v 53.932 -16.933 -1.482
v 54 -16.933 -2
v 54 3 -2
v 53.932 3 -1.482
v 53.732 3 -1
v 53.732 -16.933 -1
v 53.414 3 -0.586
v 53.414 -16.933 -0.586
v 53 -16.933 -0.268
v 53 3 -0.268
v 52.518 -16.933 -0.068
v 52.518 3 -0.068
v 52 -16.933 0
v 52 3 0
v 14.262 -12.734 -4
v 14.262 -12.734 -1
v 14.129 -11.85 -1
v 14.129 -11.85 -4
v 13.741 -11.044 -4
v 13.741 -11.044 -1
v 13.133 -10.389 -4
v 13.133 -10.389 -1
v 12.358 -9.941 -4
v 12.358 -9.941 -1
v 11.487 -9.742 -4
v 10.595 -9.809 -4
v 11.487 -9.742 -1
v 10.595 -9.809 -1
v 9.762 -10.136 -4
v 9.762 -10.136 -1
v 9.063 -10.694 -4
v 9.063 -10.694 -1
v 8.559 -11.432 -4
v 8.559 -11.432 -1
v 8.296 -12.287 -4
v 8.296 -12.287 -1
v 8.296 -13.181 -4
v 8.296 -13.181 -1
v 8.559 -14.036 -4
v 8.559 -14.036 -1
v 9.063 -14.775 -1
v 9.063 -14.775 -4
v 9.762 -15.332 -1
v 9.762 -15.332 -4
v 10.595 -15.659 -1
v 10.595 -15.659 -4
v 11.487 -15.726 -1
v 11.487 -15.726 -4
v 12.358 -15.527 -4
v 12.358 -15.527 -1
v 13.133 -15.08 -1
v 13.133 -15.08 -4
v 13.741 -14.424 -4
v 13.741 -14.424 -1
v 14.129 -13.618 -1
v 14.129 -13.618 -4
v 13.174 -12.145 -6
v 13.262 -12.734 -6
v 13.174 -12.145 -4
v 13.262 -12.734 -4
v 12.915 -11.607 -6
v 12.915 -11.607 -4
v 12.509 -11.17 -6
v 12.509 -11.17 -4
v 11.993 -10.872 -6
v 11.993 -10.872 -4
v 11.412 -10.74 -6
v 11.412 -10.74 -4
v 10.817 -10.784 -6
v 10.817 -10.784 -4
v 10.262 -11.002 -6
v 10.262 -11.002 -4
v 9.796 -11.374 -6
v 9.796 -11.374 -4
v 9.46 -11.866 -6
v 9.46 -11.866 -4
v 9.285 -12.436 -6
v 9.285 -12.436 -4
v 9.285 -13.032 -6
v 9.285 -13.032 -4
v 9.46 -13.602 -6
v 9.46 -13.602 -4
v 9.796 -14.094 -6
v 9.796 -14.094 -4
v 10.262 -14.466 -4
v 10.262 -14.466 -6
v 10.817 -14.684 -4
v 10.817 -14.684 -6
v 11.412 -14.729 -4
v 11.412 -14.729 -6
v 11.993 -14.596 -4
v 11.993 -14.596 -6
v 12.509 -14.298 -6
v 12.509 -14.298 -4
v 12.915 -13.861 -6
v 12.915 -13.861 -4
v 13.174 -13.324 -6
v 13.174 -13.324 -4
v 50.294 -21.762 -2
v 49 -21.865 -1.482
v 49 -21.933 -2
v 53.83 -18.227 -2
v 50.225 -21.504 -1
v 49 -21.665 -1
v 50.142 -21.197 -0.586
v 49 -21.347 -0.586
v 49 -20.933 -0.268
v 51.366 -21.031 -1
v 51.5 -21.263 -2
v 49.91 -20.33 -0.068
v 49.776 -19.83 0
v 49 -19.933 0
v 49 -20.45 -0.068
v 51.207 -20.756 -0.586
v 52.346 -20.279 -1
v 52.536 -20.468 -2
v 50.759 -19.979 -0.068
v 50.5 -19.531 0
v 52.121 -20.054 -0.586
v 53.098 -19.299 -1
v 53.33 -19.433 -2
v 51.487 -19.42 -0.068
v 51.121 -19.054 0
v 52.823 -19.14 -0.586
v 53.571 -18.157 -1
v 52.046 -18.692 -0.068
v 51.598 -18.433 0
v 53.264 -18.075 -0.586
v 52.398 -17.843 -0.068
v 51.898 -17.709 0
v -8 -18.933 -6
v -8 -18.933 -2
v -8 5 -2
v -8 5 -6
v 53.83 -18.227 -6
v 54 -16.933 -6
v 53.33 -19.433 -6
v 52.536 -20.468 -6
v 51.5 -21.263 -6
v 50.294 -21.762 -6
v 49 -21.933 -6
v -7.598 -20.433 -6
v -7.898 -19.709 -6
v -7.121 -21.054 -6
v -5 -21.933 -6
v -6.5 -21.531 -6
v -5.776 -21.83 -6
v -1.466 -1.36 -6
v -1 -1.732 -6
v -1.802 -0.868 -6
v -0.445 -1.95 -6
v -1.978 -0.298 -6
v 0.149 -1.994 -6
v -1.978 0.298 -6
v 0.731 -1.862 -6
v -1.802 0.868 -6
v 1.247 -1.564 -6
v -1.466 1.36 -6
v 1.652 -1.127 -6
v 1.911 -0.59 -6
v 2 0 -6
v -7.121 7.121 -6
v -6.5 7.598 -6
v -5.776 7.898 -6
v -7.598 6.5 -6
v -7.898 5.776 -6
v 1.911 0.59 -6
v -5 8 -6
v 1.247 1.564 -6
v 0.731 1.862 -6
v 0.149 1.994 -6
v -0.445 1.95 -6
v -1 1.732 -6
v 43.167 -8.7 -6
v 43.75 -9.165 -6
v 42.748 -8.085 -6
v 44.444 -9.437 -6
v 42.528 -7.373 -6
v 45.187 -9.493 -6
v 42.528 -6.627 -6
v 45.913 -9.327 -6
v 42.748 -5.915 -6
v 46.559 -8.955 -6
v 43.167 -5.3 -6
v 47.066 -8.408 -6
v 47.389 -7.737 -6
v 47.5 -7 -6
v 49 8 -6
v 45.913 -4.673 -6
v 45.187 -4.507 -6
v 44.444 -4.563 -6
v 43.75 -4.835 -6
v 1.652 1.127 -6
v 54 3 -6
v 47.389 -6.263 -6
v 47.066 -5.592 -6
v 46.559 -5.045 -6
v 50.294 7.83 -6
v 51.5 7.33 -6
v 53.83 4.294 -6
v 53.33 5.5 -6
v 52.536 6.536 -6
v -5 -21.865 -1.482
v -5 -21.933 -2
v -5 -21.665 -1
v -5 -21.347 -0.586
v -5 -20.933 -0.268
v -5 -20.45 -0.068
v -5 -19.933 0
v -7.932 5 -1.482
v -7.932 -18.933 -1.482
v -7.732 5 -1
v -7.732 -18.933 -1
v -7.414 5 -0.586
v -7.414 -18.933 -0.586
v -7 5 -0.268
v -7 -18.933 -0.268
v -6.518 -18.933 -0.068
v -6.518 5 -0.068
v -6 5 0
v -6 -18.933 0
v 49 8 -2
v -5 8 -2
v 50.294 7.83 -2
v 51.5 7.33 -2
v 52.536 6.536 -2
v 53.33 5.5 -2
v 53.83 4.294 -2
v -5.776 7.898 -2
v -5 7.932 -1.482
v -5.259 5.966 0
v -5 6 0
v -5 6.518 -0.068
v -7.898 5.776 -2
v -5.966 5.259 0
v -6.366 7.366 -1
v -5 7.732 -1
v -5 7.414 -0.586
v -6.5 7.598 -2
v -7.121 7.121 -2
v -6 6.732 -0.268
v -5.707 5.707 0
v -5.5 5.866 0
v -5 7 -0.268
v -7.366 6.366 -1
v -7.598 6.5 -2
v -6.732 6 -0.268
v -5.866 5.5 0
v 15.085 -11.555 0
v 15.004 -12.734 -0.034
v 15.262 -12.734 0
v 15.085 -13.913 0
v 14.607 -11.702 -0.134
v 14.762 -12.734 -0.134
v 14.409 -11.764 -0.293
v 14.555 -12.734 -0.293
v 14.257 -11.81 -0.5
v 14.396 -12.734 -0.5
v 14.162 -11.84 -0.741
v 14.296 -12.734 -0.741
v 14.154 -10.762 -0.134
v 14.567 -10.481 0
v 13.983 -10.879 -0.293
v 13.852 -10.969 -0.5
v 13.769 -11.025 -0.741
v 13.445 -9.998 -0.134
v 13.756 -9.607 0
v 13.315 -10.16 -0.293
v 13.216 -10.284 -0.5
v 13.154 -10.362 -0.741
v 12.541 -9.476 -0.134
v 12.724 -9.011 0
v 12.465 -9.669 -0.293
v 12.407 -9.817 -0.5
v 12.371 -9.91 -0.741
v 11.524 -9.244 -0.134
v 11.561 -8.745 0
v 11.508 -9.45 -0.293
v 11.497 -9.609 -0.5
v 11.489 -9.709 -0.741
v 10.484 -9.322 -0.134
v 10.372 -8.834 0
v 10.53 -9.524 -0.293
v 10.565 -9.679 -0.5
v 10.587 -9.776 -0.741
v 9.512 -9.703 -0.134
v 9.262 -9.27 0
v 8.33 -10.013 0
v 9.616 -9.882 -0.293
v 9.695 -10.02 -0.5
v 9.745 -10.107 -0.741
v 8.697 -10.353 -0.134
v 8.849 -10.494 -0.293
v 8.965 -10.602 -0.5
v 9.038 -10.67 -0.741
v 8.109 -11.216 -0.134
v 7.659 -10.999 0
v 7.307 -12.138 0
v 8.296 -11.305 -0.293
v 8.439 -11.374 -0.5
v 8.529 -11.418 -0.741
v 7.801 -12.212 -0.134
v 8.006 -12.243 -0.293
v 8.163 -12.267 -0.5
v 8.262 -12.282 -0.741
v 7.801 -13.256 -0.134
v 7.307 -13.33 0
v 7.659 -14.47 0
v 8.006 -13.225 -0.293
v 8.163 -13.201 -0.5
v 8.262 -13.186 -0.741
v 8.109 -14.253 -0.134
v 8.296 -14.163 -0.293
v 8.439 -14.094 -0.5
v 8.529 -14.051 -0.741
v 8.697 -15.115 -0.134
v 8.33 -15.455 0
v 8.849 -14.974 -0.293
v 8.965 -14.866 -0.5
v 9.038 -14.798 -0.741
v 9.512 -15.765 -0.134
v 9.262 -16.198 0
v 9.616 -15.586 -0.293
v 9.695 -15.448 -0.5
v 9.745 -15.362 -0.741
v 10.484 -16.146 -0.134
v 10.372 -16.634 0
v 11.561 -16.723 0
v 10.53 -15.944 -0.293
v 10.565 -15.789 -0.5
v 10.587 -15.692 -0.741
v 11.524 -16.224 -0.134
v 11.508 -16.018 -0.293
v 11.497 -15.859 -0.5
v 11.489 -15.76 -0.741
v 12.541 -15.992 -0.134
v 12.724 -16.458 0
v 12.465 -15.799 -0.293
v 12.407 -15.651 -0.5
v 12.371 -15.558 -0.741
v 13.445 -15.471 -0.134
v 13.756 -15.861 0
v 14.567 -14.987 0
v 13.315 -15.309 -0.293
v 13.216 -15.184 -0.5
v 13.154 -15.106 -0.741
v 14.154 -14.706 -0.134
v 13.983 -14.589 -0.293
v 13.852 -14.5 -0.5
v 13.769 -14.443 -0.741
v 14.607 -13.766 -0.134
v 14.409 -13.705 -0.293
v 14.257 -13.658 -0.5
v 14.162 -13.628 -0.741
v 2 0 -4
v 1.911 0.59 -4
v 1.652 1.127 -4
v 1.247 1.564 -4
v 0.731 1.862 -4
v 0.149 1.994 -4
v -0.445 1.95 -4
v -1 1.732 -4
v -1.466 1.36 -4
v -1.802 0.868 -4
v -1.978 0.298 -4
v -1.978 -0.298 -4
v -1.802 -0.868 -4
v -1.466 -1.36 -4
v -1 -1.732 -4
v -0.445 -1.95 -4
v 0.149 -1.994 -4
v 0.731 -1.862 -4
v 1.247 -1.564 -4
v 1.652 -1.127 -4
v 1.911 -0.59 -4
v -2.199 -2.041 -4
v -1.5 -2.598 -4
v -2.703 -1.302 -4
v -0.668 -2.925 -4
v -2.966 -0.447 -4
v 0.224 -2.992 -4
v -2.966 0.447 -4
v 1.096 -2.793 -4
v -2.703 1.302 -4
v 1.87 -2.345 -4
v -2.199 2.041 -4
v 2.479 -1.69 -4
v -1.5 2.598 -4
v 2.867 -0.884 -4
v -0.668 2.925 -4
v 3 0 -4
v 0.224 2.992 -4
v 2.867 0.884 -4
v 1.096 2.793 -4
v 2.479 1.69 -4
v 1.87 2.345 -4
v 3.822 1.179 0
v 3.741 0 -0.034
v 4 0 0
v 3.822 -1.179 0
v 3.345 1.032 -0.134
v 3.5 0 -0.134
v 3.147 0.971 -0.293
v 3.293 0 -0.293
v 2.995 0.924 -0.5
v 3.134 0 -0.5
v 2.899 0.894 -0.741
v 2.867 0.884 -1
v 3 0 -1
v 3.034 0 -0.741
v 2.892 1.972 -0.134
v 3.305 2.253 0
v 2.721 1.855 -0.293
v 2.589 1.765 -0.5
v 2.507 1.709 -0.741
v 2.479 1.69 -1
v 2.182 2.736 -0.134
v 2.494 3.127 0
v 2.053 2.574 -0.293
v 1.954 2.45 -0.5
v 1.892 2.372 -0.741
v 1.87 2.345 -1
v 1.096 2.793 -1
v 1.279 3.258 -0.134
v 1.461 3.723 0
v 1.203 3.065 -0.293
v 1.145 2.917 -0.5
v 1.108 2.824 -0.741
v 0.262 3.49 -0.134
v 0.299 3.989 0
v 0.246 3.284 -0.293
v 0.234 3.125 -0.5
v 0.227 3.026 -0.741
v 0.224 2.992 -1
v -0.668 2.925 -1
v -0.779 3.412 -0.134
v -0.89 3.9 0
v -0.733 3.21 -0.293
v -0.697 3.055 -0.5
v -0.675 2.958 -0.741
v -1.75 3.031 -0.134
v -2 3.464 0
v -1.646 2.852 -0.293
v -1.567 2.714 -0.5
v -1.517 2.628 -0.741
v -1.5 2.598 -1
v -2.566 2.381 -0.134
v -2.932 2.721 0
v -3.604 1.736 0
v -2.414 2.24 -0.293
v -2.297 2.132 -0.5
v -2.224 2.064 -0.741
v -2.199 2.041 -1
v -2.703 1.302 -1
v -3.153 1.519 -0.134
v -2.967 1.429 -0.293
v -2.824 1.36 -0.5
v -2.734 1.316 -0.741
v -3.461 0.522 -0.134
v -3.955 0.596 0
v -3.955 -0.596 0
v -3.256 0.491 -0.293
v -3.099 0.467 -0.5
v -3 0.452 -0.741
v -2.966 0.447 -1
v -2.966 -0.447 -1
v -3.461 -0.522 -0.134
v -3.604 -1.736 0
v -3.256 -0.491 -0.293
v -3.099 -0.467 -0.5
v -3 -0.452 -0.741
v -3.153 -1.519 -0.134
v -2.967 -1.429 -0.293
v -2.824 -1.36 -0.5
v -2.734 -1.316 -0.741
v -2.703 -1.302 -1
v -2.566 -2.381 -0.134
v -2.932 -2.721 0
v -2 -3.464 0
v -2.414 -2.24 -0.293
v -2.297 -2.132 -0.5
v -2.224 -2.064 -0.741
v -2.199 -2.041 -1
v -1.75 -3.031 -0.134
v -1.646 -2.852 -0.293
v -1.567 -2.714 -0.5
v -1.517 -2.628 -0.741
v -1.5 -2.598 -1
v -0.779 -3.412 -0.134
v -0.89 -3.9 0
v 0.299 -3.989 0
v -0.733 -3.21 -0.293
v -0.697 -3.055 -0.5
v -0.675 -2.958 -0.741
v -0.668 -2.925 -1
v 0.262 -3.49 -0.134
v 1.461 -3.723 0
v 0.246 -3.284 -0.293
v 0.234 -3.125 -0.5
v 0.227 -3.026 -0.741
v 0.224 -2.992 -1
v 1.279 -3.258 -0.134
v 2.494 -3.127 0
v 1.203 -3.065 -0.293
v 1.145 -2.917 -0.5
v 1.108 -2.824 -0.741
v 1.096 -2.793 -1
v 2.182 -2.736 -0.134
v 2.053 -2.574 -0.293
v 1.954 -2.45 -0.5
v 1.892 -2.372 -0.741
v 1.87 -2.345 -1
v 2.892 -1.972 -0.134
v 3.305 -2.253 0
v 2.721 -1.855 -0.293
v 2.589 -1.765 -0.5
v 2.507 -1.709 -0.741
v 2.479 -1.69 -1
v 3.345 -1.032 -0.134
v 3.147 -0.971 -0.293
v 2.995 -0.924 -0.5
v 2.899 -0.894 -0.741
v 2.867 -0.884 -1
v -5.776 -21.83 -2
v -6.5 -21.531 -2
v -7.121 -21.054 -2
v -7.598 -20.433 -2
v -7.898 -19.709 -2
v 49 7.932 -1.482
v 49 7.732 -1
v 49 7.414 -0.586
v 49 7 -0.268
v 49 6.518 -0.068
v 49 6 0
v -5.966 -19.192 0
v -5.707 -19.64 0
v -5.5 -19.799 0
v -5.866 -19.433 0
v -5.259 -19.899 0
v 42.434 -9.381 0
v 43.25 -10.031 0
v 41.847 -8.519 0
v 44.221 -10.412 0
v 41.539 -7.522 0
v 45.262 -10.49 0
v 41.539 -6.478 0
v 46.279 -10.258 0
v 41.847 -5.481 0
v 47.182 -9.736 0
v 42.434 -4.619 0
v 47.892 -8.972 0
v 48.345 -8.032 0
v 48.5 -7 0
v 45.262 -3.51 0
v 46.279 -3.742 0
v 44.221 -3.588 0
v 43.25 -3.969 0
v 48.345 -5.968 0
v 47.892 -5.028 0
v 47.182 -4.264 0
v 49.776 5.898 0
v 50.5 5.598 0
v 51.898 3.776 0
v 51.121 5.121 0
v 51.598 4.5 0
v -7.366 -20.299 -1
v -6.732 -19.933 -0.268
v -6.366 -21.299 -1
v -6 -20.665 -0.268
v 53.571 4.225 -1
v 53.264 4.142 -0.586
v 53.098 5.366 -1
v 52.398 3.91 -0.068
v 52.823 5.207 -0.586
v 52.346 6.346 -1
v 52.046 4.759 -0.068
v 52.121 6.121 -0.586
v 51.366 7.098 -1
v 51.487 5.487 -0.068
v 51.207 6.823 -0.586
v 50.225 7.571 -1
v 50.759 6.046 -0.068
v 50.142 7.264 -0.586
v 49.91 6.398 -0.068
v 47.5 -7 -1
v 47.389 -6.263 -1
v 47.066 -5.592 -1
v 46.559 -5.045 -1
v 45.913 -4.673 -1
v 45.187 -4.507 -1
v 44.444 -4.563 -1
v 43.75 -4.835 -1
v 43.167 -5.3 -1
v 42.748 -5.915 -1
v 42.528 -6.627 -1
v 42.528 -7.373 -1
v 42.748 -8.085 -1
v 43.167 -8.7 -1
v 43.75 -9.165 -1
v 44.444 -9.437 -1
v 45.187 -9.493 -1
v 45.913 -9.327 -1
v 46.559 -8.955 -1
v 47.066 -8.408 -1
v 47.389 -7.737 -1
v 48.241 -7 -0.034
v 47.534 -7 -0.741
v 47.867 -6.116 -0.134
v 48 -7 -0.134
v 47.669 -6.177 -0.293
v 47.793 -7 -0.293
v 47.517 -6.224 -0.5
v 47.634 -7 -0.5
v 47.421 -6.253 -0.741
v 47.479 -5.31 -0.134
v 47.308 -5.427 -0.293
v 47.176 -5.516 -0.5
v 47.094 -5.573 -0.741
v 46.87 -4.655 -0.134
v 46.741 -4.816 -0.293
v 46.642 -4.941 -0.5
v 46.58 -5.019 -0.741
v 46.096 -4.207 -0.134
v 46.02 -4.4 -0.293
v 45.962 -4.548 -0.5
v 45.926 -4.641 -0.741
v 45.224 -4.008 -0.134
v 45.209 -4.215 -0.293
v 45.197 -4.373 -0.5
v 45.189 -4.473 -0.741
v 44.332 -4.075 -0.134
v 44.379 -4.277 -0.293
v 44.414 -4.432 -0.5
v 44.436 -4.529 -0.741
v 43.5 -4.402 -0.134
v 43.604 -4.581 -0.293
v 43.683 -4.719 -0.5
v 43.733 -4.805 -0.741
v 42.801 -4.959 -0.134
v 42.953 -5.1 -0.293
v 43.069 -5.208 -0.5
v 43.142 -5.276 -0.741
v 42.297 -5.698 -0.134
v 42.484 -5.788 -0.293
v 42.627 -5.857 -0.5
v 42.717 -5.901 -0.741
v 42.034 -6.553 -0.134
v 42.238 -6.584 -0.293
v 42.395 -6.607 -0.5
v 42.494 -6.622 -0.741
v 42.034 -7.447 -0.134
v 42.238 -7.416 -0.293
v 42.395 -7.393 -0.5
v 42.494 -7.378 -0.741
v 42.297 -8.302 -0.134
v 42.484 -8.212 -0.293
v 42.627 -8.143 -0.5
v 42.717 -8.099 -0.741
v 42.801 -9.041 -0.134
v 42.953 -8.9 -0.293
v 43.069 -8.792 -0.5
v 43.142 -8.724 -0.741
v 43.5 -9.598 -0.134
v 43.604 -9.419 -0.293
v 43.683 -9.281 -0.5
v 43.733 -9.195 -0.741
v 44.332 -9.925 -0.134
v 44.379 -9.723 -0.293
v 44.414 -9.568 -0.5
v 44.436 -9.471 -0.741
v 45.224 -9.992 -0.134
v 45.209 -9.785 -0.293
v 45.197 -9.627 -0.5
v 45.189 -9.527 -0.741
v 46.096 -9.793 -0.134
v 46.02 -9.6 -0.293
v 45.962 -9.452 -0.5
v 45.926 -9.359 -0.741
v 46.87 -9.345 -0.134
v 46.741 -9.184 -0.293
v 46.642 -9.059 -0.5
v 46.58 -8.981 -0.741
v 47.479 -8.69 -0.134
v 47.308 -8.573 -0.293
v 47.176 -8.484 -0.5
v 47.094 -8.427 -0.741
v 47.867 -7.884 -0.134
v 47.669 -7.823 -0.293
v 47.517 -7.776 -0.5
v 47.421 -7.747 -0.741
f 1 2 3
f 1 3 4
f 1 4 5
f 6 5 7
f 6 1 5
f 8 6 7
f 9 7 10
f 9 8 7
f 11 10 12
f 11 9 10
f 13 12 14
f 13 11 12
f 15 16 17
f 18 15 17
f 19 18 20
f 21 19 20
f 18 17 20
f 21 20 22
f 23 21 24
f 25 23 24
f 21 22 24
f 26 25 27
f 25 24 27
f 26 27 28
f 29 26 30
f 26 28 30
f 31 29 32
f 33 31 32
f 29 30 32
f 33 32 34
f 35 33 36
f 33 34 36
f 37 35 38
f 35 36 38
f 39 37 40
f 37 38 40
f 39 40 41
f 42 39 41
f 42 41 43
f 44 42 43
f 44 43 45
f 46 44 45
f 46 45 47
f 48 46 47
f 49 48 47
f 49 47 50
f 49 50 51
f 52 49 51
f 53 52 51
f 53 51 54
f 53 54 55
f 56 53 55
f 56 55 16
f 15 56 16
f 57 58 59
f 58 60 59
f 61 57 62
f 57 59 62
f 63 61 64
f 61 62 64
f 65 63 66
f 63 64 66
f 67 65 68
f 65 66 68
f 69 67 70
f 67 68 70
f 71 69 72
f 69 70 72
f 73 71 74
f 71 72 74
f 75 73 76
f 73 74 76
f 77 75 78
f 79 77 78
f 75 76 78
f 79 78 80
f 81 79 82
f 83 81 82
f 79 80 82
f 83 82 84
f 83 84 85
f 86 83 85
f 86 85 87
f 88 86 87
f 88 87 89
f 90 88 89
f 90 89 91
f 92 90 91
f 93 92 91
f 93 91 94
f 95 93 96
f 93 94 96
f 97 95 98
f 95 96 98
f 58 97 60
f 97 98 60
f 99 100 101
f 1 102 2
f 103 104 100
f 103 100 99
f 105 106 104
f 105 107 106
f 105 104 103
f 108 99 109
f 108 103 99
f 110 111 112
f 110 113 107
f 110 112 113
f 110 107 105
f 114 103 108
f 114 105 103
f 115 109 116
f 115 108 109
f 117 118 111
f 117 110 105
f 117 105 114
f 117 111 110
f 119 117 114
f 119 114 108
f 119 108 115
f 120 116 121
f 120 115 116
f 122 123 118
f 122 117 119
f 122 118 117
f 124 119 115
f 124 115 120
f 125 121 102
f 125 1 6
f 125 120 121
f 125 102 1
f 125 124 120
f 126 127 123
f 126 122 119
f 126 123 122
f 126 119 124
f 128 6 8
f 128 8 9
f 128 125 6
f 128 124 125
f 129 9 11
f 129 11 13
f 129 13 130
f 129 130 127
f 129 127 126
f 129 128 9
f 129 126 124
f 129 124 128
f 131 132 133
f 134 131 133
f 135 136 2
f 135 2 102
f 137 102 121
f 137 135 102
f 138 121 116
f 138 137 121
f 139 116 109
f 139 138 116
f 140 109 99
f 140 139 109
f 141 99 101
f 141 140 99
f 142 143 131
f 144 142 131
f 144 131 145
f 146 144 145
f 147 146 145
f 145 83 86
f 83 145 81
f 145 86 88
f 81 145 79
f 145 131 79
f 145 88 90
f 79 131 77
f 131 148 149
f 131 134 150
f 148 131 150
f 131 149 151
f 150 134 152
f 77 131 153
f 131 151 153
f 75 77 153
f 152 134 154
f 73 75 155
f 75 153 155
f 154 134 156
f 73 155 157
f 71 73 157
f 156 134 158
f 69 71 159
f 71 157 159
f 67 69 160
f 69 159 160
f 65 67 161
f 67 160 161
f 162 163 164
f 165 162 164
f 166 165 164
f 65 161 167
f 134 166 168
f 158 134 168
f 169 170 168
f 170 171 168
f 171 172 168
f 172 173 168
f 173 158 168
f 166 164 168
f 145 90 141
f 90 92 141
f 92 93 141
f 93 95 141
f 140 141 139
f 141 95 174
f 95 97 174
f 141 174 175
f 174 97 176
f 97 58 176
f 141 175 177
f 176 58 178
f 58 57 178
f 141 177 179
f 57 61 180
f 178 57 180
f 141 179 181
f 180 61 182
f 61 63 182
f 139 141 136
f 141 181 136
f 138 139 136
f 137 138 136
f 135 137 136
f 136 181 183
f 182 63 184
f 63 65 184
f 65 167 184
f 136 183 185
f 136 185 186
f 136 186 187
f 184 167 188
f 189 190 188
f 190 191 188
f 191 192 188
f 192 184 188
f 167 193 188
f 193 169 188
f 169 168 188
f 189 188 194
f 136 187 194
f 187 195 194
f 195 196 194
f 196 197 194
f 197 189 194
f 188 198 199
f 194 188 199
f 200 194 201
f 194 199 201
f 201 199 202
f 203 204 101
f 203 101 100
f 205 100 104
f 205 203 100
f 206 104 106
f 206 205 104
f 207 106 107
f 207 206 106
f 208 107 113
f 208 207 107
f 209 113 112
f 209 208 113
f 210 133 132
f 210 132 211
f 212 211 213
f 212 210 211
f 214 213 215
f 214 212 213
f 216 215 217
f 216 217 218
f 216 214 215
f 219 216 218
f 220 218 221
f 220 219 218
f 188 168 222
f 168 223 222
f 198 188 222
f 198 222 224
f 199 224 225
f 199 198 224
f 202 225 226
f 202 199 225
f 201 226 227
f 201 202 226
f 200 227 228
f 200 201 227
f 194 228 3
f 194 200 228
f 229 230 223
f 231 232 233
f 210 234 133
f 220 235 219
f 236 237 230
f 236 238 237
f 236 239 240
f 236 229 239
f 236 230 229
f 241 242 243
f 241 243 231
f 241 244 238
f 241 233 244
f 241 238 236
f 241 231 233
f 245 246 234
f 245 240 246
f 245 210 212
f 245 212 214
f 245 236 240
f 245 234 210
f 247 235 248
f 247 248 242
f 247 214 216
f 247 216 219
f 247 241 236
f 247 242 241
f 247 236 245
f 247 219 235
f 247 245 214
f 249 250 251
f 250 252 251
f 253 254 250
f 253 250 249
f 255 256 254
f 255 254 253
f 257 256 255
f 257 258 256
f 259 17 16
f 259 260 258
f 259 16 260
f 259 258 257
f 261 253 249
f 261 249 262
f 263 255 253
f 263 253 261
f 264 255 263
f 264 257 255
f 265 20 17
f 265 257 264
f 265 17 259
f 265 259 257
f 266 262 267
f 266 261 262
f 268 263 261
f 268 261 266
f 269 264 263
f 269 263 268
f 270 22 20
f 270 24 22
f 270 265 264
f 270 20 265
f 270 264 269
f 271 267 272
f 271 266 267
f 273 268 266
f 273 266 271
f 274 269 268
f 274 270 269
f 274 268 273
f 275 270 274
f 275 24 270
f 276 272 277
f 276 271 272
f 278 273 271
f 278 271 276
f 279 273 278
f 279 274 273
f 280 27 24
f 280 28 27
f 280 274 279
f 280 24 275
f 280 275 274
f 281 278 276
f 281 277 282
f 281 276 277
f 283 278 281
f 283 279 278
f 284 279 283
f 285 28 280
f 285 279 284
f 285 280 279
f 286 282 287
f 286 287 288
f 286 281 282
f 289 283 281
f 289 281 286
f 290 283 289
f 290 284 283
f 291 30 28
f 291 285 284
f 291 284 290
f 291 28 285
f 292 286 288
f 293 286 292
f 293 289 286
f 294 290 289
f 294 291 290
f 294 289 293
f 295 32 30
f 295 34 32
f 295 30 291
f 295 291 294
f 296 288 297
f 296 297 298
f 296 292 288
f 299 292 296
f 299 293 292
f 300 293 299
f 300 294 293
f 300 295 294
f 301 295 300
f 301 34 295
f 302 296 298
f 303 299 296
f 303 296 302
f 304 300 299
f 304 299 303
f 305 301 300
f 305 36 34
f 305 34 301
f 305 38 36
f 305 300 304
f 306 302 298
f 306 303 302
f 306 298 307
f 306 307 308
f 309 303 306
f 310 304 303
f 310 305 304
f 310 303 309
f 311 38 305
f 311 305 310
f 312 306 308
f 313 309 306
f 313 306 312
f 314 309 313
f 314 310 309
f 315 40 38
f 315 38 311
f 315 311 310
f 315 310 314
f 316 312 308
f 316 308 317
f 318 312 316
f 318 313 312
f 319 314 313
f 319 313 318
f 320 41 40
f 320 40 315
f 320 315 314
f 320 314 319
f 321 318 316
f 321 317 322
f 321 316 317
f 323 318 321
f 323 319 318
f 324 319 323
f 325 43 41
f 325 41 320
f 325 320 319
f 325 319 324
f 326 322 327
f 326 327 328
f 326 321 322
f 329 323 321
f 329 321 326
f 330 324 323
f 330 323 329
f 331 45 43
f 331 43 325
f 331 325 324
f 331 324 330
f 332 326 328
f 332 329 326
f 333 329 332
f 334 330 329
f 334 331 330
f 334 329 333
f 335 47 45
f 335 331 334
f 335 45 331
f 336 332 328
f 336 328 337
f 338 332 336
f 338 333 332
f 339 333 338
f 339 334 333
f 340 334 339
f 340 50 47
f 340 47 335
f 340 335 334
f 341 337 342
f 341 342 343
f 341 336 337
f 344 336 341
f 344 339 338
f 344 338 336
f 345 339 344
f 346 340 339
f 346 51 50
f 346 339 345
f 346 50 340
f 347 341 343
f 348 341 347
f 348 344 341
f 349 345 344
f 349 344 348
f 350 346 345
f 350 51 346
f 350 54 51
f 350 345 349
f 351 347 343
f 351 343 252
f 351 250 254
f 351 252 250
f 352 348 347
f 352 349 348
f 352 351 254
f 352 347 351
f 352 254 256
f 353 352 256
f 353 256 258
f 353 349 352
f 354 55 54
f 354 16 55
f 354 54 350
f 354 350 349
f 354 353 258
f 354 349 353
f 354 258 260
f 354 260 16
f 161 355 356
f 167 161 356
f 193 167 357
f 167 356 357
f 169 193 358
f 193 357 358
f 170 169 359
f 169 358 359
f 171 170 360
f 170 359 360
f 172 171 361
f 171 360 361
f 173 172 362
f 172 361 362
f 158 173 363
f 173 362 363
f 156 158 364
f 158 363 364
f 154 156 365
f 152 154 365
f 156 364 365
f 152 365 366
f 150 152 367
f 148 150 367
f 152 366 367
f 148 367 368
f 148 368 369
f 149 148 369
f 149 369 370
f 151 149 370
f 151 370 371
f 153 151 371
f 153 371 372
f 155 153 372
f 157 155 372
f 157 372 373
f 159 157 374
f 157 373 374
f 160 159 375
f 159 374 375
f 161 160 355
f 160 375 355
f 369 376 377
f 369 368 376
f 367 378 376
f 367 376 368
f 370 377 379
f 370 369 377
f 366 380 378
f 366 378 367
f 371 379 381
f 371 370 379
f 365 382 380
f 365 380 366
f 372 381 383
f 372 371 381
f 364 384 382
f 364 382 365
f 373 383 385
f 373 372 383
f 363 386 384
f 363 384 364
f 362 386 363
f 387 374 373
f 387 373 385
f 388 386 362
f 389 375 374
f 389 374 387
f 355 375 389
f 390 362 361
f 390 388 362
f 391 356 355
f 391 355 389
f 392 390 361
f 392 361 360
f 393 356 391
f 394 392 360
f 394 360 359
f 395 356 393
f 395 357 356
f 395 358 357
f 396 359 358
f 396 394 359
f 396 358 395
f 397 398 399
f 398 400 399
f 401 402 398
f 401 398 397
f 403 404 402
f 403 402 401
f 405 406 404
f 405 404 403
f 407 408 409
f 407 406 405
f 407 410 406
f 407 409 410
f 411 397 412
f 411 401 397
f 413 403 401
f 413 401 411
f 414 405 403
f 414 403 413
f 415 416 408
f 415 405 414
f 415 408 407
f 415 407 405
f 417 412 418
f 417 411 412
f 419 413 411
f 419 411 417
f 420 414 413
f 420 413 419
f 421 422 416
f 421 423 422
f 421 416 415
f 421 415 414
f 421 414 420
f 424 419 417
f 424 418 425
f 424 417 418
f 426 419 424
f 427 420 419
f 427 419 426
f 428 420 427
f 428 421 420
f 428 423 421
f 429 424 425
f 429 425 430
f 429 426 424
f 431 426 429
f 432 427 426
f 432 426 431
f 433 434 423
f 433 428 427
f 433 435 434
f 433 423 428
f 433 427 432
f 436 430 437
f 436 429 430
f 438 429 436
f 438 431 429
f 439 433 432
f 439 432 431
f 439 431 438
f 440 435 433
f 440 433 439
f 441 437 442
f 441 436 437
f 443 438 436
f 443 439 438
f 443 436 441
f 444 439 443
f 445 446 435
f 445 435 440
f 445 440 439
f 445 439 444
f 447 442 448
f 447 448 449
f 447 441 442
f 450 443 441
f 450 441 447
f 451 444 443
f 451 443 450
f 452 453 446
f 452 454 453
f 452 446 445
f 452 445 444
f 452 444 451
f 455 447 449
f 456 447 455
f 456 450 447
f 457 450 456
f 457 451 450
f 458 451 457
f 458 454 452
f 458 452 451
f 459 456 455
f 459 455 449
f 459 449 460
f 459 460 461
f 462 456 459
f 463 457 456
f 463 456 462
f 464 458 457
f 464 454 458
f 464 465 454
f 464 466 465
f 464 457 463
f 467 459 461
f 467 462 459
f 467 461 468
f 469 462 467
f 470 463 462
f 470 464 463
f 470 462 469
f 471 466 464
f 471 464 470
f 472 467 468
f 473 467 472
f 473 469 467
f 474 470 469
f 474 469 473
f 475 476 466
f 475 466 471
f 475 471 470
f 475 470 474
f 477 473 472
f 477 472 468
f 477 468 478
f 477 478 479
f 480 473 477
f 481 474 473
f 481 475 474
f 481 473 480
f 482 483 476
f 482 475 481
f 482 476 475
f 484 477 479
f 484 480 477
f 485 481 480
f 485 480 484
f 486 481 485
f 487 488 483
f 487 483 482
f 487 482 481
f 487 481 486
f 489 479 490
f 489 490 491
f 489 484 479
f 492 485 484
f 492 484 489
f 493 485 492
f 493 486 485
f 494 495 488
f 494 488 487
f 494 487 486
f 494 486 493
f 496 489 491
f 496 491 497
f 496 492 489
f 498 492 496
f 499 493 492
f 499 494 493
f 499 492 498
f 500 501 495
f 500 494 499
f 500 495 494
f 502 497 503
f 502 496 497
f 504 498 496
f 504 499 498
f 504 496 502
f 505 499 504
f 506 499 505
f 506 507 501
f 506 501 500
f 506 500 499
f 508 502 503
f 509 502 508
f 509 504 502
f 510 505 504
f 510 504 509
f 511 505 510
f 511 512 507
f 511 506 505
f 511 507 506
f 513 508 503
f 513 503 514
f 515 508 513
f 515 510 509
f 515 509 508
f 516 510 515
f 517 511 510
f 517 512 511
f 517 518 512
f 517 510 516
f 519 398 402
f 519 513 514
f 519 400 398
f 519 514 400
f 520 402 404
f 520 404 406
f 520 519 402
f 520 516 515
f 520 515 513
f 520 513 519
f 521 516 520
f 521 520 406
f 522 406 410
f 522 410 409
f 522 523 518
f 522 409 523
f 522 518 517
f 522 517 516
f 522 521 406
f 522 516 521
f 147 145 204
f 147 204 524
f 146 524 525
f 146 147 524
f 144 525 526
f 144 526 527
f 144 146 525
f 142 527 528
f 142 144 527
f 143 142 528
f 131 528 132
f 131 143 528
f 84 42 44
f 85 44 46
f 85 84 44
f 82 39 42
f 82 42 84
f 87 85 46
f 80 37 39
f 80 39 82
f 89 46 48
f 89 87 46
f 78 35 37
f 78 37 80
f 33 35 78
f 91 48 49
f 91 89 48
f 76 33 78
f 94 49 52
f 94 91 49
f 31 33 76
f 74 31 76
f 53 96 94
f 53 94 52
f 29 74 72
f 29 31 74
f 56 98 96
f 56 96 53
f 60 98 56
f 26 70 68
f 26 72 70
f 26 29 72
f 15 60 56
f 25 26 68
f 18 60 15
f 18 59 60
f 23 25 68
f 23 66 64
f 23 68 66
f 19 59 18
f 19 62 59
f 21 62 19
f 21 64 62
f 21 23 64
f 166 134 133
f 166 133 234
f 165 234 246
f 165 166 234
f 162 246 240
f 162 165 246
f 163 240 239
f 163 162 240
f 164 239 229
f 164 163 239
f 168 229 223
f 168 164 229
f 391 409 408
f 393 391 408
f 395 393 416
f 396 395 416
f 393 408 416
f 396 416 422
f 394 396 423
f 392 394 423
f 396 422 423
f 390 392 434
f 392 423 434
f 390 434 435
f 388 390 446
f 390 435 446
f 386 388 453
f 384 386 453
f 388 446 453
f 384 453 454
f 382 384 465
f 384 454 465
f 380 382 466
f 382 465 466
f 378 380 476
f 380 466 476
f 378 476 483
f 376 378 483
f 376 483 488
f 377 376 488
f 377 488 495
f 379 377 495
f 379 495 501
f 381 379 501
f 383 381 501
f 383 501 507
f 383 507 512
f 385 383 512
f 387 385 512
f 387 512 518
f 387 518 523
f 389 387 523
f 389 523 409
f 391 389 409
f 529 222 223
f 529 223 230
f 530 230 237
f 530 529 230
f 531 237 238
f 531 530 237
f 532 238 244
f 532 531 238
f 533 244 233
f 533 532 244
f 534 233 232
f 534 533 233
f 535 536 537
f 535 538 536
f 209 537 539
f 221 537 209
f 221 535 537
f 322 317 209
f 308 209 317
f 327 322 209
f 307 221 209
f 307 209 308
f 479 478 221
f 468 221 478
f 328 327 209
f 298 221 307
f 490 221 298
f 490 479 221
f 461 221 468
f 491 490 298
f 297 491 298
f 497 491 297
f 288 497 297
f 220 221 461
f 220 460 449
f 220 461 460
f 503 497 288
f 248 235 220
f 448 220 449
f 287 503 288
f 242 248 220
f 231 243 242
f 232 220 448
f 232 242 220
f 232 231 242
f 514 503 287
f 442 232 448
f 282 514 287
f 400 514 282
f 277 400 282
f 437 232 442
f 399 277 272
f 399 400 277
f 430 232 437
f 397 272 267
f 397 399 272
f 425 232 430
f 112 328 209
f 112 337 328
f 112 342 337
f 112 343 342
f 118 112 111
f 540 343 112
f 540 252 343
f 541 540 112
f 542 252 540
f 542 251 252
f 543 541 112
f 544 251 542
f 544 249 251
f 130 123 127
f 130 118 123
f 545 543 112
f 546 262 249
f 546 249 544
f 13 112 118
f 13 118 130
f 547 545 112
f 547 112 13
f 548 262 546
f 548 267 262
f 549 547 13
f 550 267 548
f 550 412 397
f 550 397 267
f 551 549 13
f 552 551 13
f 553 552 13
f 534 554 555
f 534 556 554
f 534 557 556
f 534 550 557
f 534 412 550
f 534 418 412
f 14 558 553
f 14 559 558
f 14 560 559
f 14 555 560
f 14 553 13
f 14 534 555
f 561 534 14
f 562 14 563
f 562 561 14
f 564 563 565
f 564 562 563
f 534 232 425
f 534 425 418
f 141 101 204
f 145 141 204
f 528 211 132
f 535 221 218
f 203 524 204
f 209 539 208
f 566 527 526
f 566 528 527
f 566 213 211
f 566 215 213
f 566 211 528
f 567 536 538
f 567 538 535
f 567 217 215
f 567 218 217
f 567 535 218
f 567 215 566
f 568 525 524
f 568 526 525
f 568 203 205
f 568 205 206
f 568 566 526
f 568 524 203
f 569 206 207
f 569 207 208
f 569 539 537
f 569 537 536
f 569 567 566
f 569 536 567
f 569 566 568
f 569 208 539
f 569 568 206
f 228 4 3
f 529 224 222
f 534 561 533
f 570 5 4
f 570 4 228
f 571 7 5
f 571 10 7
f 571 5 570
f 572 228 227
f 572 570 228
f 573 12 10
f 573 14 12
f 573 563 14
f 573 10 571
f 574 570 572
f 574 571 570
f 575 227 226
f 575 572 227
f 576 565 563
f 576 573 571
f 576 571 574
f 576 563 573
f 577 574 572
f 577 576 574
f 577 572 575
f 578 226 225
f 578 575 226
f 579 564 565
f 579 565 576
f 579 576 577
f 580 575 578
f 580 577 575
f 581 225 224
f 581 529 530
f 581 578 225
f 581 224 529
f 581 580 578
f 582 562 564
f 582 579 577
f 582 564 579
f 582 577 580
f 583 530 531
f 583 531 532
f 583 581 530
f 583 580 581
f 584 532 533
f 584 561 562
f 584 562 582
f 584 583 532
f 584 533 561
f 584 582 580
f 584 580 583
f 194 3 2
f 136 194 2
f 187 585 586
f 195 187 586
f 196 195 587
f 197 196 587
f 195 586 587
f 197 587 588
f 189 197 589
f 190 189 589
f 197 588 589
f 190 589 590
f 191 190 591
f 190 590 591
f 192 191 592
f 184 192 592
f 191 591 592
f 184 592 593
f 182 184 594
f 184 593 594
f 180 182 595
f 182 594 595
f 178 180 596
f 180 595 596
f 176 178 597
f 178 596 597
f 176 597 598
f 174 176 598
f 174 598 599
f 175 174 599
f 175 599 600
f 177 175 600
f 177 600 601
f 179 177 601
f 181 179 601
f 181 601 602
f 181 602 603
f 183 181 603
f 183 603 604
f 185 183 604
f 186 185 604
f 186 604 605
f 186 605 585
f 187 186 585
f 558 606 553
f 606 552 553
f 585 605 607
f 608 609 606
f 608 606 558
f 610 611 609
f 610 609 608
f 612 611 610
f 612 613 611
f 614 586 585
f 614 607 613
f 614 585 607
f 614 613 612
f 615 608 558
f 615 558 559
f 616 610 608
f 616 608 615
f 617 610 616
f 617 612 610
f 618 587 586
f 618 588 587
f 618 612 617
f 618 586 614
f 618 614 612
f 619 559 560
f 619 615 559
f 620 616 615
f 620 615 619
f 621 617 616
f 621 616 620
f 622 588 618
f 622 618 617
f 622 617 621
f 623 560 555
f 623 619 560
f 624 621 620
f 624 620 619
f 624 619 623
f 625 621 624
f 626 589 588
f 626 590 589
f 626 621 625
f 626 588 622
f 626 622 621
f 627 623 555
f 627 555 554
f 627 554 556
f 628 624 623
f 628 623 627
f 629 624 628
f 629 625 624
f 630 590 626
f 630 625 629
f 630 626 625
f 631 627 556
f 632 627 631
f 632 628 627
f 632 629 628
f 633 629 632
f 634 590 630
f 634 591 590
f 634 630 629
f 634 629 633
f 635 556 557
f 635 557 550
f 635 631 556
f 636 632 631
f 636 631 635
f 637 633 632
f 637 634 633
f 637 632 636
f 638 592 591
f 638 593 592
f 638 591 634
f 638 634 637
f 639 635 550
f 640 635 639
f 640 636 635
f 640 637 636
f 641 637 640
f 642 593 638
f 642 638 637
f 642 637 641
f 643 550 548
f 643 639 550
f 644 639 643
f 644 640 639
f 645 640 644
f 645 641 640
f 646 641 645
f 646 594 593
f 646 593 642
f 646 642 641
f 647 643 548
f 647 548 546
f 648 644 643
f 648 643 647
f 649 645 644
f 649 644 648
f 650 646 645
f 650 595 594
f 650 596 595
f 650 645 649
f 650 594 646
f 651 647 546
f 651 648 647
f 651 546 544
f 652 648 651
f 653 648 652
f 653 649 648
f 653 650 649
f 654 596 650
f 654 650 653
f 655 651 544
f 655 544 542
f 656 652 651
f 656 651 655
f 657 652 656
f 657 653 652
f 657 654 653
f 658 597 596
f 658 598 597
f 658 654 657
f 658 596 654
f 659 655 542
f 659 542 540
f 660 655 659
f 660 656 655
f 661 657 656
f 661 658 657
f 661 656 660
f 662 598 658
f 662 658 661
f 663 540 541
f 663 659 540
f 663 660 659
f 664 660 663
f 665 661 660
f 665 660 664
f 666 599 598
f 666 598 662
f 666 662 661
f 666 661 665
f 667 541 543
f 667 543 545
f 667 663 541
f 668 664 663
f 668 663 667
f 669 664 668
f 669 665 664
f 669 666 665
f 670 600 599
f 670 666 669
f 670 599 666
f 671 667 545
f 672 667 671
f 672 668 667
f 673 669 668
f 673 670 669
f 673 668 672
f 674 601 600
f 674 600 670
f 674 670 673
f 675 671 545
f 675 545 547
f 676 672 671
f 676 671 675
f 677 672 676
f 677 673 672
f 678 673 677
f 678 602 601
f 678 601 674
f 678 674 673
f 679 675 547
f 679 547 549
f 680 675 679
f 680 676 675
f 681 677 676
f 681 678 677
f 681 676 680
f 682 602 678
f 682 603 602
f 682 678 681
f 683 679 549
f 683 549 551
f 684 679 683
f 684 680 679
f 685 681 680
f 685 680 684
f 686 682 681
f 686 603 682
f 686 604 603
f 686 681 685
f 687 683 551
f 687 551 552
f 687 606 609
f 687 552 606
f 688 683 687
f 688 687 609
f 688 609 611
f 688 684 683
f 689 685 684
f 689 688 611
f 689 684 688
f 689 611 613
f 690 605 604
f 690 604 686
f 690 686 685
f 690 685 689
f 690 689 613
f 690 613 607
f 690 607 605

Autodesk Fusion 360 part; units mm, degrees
sketch "Sketch1" plane through (0, 0, 0) normal (0, 0, 1) x (1, 0, 0)
  circle A0 centre (0, 0) radius 2
  circle A1 centre (11.2624, -12.7341) radius 2
  circle A2 centre (11.2624, -12.7341) radius 3
  circle A3 centre (0, 0) radius 3
  line L0 (-8, 8) -> (54, 8)
  line L1 (54, 8) -> (54, -21.9327)
  line L2 (54, -21.9327) -> (-8, -21.9327)
  line L3 (-8, -21.9327) -> (-8, 8)
  circle A4 centre (45, -7) radius 2.5
  dimension "d1" = 4
  dimension "d2" = 4
  dimension "d3" = 6
  dimension "d4" = 6
  dimension "d5" = 17
  dimension "d6" = 5
extrude "Extrude1" add sketch "Sketch1" against normal blind 6 contours A2 | A3 | L0 L1 L2 L3
extrude "Extrude2" cut sketch "Sketch1" against normal blind 4 contours A2 | A3
fillet "Fillet1" radius 5 2 edges at (54, -21.9327, -3) (54, 8, -3)
fillet "Fillet2" radius 3 2 edges at (-8, -21.9327, -3) (-8, 8, -3)
fillet "Fillet3" radius 2 8 edges at (-8, -6.9663, 0) (-7.1213, 7.1213, 0) (22, 8, 0) (52.5355, 6.5355, 0) (54, -6.9663, 0) (52.5355, -20.4682, 0) (22, -21.9327, 0) (-7.1213, -21.054, 0)
fillet "Fillet4" radius 1 3 edges at (42.6692, -6.096, 0) (8.4654, -11.6493, 0) (-2.797, 1.0848, 0)
